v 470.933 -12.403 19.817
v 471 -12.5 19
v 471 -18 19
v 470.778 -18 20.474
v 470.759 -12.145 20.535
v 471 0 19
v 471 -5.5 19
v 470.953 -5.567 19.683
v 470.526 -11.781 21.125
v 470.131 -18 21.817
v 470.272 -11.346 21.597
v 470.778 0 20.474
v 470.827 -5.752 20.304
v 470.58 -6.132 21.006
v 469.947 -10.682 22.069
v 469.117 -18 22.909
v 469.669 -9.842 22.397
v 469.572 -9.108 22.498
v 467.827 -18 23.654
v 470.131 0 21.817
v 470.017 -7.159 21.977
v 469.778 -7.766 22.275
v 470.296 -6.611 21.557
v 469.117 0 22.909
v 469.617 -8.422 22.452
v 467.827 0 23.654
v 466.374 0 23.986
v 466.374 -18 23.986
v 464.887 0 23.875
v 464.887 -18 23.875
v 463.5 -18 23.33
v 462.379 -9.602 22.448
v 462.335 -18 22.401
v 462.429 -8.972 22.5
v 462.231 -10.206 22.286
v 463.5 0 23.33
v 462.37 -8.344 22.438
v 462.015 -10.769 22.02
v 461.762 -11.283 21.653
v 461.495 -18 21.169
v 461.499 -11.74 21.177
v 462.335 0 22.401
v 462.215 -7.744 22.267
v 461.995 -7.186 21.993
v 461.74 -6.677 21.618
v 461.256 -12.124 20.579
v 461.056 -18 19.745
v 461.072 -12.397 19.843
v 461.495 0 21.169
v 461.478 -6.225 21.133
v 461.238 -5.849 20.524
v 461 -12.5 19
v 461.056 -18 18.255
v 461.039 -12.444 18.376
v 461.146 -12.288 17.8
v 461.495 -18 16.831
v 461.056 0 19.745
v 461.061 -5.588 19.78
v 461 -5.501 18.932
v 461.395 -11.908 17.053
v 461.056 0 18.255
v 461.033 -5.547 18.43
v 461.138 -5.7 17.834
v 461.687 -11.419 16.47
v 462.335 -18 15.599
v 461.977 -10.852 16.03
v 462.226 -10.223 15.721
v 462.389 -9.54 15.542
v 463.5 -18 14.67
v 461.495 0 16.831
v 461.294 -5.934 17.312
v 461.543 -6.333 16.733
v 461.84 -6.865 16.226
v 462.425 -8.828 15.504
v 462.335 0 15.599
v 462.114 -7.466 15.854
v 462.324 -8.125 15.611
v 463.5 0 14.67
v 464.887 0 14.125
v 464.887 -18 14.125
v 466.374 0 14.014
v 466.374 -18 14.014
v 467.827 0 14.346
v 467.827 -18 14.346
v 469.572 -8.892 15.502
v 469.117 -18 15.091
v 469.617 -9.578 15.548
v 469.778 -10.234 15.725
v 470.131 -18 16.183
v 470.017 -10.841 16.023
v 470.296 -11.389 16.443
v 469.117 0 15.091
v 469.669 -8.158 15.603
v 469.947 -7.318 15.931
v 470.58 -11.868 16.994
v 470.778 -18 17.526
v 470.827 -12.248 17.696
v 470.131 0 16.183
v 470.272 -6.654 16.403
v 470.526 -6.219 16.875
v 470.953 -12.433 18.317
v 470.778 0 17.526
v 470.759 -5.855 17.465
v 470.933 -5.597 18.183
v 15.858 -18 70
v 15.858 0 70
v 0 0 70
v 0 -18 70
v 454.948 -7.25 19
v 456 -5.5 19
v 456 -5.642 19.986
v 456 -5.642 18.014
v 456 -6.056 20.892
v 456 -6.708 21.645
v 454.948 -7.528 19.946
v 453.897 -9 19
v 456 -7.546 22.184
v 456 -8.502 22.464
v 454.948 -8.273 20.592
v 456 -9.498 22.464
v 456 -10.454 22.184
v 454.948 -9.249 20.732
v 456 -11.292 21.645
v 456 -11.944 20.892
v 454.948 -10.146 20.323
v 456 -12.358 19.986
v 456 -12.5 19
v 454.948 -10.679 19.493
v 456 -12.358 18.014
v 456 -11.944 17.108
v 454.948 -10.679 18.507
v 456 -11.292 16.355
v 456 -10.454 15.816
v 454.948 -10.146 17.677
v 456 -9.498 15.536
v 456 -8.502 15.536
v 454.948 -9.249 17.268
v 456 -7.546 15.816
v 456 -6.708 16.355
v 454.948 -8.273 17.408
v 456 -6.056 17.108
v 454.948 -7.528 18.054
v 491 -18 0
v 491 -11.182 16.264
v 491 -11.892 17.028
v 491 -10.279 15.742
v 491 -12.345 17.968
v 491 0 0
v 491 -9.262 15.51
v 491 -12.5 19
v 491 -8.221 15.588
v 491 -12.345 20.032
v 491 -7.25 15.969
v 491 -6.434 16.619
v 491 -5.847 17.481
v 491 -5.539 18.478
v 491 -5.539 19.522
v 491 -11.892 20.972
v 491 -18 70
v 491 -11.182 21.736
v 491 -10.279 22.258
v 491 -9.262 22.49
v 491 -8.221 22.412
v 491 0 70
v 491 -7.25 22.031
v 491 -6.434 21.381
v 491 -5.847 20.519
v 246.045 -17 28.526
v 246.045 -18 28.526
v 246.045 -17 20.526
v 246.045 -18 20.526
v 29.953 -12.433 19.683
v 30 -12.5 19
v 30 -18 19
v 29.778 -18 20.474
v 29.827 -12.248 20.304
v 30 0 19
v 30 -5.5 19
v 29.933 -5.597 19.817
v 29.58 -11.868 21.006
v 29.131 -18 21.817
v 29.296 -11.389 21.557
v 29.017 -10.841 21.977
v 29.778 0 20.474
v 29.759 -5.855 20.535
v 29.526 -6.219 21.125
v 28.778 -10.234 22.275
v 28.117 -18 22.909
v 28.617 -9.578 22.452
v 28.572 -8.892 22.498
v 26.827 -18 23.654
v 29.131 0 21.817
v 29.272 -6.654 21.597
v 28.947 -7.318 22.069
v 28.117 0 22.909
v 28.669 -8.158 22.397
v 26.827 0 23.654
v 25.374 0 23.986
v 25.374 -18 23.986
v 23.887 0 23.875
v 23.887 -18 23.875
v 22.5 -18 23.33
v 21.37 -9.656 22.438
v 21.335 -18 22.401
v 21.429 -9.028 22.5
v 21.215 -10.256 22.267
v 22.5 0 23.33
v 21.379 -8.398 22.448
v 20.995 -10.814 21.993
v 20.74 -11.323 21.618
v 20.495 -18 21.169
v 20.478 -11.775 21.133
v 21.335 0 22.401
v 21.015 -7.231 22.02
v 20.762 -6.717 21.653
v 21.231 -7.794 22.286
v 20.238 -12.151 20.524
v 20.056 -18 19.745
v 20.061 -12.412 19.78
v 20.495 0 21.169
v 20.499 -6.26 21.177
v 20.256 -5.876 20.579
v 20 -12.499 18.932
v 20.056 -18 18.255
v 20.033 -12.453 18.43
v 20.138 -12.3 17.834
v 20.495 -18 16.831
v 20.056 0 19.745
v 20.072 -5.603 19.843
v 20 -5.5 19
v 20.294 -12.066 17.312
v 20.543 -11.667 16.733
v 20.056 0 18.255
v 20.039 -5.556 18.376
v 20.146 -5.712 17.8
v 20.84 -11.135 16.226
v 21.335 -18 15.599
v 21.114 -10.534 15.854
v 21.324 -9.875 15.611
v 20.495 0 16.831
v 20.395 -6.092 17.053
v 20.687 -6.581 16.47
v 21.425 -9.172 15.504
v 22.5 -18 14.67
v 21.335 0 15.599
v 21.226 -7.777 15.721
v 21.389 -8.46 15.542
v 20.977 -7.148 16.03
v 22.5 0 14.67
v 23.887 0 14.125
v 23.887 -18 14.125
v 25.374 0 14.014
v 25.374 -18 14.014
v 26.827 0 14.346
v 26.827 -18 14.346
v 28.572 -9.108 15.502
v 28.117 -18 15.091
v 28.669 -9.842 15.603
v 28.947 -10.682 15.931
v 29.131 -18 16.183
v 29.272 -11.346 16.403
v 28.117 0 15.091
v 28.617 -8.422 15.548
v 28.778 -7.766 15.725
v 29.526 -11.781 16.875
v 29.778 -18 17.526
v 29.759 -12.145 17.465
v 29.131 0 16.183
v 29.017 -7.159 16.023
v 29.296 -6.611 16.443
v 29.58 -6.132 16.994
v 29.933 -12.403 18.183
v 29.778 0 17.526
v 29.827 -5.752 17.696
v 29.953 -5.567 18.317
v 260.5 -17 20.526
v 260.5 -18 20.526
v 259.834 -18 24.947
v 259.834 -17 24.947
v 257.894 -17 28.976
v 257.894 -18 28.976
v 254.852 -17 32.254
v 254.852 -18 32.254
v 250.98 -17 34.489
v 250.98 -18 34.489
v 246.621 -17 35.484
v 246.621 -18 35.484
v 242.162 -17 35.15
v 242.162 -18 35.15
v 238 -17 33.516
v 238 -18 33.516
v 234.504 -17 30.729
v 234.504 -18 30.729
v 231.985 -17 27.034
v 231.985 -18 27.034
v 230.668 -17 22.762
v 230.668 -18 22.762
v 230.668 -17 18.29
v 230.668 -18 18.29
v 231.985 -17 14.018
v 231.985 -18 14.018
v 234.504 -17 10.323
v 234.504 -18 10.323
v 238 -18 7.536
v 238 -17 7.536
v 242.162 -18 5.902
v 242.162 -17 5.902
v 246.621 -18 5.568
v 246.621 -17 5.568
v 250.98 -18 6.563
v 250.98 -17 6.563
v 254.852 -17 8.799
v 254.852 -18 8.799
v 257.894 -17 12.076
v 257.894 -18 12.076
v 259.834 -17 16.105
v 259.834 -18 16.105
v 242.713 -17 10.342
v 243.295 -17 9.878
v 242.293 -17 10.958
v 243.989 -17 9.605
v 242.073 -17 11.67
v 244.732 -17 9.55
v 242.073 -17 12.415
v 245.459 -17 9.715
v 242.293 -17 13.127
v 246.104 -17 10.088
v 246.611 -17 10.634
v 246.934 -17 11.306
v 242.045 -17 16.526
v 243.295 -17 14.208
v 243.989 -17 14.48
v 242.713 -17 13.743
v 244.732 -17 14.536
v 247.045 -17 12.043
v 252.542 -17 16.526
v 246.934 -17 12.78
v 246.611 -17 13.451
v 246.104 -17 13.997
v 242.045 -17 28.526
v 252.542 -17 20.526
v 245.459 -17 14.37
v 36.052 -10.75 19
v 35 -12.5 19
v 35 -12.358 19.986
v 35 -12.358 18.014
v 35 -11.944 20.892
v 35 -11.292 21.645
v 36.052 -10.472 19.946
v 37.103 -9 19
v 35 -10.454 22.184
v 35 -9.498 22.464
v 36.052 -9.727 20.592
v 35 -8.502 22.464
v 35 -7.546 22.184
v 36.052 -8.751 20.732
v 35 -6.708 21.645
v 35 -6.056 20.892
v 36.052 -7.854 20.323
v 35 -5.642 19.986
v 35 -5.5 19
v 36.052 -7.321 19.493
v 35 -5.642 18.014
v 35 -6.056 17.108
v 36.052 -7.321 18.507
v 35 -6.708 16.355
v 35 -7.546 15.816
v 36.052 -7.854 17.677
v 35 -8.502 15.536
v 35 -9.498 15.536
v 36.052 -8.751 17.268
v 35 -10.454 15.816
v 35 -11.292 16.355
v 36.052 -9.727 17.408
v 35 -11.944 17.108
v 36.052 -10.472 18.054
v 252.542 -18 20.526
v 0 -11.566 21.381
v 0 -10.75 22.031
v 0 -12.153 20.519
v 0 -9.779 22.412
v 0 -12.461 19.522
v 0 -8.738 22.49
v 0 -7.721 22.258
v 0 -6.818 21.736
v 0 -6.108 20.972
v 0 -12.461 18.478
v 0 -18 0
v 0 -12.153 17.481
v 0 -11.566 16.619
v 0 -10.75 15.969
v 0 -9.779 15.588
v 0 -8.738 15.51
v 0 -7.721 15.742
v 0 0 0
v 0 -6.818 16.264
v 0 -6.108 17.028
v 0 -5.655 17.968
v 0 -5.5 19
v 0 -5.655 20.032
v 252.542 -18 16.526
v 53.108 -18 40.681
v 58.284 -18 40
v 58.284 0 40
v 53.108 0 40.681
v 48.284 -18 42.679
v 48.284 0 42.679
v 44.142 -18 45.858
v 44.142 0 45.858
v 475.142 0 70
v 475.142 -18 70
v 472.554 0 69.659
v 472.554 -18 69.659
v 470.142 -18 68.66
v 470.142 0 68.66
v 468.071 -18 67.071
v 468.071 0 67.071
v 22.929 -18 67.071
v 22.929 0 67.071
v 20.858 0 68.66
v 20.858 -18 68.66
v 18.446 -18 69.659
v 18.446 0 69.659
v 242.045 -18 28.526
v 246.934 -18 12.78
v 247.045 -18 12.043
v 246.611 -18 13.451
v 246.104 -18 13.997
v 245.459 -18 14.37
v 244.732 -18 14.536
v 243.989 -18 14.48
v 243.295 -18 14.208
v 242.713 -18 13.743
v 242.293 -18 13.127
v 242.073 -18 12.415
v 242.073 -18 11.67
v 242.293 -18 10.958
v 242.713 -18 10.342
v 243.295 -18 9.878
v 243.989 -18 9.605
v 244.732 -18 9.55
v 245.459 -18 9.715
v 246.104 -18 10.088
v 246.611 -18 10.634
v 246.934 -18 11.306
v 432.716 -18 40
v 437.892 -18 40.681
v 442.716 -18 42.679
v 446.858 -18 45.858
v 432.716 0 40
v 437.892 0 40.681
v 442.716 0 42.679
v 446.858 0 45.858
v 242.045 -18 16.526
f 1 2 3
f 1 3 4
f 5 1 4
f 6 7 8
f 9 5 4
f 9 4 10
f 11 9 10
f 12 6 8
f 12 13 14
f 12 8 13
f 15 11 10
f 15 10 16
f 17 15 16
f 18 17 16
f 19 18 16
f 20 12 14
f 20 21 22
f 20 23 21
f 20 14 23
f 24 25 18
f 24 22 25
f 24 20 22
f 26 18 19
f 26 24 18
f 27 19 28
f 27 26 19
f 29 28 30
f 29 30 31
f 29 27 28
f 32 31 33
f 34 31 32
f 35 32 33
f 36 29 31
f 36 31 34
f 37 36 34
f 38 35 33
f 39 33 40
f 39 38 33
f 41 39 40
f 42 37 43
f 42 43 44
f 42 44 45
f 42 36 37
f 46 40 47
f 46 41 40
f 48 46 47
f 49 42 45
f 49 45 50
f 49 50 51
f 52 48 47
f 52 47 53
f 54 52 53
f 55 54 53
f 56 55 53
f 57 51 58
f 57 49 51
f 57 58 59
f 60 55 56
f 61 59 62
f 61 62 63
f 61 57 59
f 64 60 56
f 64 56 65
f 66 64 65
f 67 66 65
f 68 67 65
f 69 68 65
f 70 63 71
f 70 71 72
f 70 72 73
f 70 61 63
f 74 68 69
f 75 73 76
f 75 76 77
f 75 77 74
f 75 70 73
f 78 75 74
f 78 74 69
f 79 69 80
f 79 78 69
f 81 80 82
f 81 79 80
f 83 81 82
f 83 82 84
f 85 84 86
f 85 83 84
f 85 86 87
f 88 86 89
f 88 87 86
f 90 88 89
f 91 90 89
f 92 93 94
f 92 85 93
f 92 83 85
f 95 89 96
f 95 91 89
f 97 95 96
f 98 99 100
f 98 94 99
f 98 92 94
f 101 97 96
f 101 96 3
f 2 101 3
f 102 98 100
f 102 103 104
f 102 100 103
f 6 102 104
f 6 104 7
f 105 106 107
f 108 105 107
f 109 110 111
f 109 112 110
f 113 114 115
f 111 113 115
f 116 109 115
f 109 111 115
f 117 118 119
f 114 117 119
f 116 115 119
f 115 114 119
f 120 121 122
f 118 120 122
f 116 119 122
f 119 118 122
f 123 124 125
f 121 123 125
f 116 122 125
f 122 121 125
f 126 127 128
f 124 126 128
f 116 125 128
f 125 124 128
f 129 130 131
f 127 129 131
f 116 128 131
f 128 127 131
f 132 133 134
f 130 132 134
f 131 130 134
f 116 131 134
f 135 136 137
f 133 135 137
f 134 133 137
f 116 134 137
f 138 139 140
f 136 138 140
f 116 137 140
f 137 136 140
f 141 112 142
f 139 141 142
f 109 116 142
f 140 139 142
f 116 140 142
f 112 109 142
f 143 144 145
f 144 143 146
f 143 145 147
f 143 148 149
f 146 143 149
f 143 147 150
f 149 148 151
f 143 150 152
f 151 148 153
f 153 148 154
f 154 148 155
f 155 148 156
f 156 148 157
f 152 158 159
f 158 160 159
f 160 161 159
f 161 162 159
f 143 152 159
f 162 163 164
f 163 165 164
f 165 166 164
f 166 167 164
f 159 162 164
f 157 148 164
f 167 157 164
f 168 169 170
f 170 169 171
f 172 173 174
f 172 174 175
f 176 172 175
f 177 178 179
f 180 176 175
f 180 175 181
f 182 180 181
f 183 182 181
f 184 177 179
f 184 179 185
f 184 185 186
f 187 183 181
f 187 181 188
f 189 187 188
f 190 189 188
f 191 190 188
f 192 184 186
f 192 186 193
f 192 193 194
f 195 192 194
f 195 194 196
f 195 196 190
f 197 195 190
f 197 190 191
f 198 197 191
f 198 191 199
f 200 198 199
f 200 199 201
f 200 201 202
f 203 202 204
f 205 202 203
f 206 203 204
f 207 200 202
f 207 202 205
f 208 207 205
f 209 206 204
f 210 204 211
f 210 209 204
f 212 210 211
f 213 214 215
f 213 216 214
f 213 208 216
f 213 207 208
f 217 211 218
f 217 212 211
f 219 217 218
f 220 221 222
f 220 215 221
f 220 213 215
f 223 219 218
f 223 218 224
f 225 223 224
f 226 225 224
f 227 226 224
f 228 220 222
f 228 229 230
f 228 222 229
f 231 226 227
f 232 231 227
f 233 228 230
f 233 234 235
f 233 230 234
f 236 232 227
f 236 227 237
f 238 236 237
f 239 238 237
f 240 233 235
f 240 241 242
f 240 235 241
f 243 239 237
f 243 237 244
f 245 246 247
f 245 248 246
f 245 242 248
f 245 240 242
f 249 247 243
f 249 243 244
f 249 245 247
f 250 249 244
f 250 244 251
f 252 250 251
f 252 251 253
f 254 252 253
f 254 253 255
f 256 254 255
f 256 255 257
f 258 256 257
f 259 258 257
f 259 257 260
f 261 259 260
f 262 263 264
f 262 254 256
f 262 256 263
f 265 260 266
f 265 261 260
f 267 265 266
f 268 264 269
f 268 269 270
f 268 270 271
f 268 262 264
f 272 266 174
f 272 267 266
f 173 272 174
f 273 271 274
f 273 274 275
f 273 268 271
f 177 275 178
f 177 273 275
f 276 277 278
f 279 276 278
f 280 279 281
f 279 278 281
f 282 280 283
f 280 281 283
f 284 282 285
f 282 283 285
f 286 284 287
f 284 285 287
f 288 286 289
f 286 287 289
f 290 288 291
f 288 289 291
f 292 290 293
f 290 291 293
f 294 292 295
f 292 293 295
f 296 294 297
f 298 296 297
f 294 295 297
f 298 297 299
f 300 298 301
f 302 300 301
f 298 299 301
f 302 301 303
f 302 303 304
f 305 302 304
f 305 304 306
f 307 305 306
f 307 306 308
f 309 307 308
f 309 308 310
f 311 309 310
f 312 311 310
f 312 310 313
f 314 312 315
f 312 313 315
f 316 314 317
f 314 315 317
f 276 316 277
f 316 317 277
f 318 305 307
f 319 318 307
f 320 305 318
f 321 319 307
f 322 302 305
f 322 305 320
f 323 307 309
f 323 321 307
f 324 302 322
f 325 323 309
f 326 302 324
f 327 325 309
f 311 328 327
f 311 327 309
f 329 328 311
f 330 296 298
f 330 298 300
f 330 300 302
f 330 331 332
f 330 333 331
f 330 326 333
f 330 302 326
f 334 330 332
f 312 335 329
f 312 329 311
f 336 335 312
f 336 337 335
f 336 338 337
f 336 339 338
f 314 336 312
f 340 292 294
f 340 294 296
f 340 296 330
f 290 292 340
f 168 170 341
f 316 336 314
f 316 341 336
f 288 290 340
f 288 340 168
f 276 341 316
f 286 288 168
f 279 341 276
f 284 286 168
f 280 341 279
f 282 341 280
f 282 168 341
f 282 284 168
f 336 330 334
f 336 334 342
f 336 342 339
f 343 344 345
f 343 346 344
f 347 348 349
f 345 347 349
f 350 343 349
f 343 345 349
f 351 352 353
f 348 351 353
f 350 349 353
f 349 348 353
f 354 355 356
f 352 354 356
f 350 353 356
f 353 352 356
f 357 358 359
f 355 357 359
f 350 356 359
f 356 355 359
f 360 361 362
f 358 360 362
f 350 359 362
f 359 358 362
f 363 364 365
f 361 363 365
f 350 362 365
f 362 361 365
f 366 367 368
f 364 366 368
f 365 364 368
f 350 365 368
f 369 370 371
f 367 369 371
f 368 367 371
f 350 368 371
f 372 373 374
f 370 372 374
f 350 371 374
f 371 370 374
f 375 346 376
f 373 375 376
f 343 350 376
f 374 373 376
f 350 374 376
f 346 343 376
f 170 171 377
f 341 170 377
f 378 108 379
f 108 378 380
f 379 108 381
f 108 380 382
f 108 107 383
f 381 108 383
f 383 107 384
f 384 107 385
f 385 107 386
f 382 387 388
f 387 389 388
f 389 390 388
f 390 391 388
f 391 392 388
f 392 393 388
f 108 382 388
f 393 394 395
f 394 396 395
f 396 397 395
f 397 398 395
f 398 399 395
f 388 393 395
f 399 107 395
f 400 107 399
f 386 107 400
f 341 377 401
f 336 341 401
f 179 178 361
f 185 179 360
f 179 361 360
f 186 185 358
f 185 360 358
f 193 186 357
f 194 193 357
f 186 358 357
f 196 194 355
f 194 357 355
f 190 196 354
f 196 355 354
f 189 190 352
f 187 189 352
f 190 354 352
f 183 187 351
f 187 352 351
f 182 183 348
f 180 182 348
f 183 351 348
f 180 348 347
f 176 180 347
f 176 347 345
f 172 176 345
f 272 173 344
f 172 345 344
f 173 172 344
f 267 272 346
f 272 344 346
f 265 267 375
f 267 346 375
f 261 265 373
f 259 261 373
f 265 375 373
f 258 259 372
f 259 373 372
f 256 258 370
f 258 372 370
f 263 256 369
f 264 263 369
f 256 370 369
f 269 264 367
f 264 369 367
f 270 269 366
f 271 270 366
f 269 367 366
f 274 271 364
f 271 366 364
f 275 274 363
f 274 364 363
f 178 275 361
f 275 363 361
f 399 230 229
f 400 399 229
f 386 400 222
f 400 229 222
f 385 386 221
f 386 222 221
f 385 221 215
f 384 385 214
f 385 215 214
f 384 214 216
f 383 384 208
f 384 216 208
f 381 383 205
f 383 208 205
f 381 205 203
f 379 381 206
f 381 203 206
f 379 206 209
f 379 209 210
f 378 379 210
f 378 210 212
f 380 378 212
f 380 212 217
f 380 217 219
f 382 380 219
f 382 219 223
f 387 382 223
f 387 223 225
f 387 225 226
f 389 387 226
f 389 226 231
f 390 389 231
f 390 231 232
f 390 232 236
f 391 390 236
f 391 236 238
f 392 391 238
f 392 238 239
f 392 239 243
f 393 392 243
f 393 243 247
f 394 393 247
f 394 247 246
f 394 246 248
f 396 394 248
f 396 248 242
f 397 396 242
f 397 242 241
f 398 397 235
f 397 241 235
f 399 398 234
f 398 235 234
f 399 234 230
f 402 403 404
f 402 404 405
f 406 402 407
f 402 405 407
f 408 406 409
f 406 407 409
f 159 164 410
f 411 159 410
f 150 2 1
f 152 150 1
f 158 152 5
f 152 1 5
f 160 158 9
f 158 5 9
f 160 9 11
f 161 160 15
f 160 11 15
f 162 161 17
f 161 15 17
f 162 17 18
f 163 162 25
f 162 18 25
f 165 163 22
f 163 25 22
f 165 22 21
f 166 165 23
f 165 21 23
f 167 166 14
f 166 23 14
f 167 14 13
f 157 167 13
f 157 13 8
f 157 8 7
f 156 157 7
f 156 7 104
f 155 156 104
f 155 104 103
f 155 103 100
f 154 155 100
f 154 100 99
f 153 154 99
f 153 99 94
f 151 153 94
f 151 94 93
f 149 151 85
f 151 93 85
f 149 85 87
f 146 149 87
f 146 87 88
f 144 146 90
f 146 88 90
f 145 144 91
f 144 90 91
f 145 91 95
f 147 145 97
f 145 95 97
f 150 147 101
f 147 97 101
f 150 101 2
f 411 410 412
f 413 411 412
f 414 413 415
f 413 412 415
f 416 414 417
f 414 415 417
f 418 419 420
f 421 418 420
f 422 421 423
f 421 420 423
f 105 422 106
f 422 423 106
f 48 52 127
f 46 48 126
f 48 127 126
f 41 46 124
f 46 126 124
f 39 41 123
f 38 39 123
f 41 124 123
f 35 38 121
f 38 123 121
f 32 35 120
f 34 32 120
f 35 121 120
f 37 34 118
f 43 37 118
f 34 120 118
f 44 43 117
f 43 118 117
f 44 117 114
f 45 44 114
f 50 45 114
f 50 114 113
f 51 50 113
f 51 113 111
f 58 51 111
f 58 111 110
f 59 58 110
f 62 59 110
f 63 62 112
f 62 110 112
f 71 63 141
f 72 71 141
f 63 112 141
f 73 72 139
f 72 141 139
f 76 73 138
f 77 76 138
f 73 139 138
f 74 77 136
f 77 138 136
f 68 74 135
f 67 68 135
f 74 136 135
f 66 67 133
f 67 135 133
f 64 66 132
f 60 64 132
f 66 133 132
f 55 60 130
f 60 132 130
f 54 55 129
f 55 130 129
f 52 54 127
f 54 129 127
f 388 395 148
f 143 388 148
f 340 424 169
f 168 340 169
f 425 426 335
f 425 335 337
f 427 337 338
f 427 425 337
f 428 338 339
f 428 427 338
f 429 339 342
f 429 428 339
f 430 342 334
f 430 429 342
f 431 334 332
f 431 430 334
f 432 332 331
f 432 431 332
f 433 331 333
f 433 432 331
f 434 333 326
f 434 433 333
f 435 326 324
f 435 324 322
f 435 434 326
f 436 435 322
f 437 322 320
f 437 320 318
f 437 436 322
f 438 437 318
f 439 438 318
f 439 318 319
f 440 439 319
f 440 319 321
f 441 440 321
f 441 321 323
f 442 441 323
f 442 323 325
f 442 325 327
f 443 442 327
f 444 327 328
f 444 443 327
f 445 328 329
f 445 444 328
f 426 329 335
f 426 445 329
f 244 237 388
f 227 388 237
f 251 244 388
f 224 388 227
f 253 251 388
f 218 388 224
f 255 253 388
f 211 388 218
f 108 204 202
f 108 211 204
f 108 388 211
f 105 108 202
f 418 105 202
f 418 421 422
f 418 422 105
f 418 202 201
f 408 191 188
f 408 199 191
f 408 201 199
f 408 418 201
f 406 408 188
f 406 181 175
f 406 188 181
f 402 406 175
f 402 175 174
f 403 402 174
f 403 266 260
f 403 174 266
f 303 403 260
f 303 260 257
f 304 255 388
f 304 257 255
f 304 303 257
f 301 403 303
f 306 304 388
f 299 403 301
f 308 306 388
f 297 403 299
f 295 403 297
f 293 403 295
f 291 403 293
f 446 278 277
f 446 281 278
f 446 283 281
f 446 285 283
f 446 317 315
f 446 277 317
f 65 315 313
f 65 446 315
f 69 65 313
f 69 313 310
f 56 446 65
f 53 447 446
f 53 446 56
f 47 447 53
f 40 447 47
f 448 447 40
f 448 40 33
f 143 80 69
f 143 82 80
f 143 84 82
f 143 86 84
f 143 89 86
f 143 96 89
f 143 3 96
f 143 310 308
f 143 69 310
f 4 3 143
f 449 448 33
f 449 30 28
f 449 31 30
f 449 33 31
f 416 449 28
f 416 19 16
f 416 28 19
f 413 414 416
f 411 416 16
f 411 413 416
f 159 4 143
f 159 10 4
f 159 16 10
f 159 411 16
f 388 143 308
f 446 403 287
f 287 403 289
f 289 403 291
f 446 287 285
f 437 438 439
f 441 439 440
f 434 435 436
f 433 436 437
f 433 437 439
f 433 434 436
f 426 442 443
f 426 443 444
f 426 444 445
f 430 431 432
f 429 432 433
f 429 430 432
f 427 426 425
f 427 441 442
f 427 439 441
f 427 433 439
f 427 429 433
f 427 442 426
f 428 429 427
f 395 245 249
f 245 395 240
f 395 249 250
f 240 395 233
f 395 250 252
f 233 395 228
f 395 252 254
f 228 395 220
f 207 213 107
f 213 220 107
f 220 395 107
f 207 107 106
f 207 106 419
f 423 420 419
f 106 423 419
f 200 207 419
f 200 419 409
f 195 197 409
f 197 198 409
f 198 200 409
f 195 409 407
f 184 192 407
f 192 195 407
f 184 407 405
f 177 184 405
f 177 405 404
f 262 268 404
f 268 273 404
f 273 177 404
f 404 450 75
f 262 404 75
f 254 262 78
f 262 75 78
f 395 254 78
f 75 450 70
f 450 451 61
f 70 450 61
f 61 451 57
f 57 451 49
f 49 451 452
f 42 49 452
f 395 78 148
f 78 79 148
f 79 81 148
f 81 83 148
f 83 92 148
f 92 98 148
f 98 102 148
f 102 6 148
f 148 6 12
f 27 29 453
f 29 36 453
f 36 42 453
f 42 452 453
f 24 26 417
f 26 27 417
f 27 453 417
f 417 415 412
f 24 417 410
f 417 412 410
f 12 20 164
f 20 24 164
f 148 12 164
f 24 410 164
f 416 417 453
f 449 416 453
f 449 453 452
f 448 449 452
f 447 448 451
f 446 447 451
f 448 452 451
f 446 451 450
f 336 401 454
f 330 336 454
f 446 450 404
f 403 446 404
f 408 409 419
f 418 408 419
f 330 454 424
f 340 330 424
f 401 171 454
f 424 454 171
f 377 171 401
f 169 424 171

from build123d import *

# Parameters (mm, degrees)
F0_R     = 5
F1_DEPTH = 18
F4_D     = 7
F4_DEPTH = 35
F4_TIP   = 2.1030121666
F5_D     = 7
F5_DEPTH = 35
F5_TIP   = 2.1030121666
F6_R     = 15
F6_R_2   = 2.5
F7_DEPTH = 1


with BuildPart() as f1:
    # F0 (on Front) → F1 (new body)
    with BuildSketch(Plane.XZ):
        with BuildLine():
            Line((0, 70), (0, 0))
            Line((0, 0), (491, 0))
            Line((491, 0), (491, 70))
            Line((491, 70), (475.1421356237, 70))
            ThreePointArc((475.1421356237, 70), (471.3153013001, 69.2387953251), (468.0710678119, 67.0710678119))
            Line((468.0710678119, 67.0710678119), (446.8578643763, 45.8578643763))
            ThreePointArc((446.8578643763, 45.8578643763), (440.3693973998, 41.5224093498), (432.7157287525, 40))
            Line((432.7157287525, 40), (58.2842712475, 40))
            ThreePointArc((58.2842712475, 40), (50.6306026002, 41.5224093498), (44.1421356237, 45.8578643763))
            Line((44.1421356237, 45.8578643763), (22.9289321881, 67.0710678119))
            ThreePointArc((22.9289321881, 67.0710678119), (19.6846986999, 69.2387953251), (15.8578643763, 70))
            Line((15.8578643763, 70), (0, 70))
        make_face()
        with Locations((25, 19)):
            Circle(F0_R, mode=Mode.SUBTRACT)
        with Locations((466, 19)):
            Circle(F0_R, mode=Mode.SUBTRACT)
    extrude(amount=F1_DEPTH)

    # F4
    with Locations(Plane(origin=(0, 0, 0), x_dir=(0, -1, 0), z_dir=(-1, 0, 0))):
        with Locations((9, 19)):
            Hole(F4_D / 2, depth=F4_DEPTH)
            with Locations((0, 0, -(F4_DEPTH + F4_TIP / 2))):  # 118° drill point
                Cone(0, F4_D / 2, F4_TIP, mode=Mode.SUBTRACT)

    # F5
    with Locations(Plane.YZ.offset(491)):
        with Locations((-9, 19)):
            Hole(F5_D / 2, depth=F5_DEPTH)
            with Locations((0, 0, -(F5_DEPTH + F5_TIP / 2))):  # 118° drill point
                Cone(0, F5_D / 2, F5_TIP, mode=Mode.SUBTRACT)

    # F6 (on face) → F7 (cut)
    with BuildSketch(Plane.XZ.offset(18)):
        with Locations((245.5, 20.5260608345)):
            Circle(F6_R)
        with Locations((244.5451939106, 12.0426760986)):
            Circle(F6_R_2, mode=Mode.SUBTRACT)
        Polygon((242.0451939106, 16.5260608345), (242.0451939106, 28.5260608345), (246.0451939106, 28.5260608345), (246.0451939106, 20.5260608345), (252.542167902, 20.5260608345), (252.542167902, 16.5260608345), align=None, mode=Mode.SUBTRACT)
    extrude(amount=-F7_DEPTH, mode=Mode.SUBTRACT)


solid = f1.part
